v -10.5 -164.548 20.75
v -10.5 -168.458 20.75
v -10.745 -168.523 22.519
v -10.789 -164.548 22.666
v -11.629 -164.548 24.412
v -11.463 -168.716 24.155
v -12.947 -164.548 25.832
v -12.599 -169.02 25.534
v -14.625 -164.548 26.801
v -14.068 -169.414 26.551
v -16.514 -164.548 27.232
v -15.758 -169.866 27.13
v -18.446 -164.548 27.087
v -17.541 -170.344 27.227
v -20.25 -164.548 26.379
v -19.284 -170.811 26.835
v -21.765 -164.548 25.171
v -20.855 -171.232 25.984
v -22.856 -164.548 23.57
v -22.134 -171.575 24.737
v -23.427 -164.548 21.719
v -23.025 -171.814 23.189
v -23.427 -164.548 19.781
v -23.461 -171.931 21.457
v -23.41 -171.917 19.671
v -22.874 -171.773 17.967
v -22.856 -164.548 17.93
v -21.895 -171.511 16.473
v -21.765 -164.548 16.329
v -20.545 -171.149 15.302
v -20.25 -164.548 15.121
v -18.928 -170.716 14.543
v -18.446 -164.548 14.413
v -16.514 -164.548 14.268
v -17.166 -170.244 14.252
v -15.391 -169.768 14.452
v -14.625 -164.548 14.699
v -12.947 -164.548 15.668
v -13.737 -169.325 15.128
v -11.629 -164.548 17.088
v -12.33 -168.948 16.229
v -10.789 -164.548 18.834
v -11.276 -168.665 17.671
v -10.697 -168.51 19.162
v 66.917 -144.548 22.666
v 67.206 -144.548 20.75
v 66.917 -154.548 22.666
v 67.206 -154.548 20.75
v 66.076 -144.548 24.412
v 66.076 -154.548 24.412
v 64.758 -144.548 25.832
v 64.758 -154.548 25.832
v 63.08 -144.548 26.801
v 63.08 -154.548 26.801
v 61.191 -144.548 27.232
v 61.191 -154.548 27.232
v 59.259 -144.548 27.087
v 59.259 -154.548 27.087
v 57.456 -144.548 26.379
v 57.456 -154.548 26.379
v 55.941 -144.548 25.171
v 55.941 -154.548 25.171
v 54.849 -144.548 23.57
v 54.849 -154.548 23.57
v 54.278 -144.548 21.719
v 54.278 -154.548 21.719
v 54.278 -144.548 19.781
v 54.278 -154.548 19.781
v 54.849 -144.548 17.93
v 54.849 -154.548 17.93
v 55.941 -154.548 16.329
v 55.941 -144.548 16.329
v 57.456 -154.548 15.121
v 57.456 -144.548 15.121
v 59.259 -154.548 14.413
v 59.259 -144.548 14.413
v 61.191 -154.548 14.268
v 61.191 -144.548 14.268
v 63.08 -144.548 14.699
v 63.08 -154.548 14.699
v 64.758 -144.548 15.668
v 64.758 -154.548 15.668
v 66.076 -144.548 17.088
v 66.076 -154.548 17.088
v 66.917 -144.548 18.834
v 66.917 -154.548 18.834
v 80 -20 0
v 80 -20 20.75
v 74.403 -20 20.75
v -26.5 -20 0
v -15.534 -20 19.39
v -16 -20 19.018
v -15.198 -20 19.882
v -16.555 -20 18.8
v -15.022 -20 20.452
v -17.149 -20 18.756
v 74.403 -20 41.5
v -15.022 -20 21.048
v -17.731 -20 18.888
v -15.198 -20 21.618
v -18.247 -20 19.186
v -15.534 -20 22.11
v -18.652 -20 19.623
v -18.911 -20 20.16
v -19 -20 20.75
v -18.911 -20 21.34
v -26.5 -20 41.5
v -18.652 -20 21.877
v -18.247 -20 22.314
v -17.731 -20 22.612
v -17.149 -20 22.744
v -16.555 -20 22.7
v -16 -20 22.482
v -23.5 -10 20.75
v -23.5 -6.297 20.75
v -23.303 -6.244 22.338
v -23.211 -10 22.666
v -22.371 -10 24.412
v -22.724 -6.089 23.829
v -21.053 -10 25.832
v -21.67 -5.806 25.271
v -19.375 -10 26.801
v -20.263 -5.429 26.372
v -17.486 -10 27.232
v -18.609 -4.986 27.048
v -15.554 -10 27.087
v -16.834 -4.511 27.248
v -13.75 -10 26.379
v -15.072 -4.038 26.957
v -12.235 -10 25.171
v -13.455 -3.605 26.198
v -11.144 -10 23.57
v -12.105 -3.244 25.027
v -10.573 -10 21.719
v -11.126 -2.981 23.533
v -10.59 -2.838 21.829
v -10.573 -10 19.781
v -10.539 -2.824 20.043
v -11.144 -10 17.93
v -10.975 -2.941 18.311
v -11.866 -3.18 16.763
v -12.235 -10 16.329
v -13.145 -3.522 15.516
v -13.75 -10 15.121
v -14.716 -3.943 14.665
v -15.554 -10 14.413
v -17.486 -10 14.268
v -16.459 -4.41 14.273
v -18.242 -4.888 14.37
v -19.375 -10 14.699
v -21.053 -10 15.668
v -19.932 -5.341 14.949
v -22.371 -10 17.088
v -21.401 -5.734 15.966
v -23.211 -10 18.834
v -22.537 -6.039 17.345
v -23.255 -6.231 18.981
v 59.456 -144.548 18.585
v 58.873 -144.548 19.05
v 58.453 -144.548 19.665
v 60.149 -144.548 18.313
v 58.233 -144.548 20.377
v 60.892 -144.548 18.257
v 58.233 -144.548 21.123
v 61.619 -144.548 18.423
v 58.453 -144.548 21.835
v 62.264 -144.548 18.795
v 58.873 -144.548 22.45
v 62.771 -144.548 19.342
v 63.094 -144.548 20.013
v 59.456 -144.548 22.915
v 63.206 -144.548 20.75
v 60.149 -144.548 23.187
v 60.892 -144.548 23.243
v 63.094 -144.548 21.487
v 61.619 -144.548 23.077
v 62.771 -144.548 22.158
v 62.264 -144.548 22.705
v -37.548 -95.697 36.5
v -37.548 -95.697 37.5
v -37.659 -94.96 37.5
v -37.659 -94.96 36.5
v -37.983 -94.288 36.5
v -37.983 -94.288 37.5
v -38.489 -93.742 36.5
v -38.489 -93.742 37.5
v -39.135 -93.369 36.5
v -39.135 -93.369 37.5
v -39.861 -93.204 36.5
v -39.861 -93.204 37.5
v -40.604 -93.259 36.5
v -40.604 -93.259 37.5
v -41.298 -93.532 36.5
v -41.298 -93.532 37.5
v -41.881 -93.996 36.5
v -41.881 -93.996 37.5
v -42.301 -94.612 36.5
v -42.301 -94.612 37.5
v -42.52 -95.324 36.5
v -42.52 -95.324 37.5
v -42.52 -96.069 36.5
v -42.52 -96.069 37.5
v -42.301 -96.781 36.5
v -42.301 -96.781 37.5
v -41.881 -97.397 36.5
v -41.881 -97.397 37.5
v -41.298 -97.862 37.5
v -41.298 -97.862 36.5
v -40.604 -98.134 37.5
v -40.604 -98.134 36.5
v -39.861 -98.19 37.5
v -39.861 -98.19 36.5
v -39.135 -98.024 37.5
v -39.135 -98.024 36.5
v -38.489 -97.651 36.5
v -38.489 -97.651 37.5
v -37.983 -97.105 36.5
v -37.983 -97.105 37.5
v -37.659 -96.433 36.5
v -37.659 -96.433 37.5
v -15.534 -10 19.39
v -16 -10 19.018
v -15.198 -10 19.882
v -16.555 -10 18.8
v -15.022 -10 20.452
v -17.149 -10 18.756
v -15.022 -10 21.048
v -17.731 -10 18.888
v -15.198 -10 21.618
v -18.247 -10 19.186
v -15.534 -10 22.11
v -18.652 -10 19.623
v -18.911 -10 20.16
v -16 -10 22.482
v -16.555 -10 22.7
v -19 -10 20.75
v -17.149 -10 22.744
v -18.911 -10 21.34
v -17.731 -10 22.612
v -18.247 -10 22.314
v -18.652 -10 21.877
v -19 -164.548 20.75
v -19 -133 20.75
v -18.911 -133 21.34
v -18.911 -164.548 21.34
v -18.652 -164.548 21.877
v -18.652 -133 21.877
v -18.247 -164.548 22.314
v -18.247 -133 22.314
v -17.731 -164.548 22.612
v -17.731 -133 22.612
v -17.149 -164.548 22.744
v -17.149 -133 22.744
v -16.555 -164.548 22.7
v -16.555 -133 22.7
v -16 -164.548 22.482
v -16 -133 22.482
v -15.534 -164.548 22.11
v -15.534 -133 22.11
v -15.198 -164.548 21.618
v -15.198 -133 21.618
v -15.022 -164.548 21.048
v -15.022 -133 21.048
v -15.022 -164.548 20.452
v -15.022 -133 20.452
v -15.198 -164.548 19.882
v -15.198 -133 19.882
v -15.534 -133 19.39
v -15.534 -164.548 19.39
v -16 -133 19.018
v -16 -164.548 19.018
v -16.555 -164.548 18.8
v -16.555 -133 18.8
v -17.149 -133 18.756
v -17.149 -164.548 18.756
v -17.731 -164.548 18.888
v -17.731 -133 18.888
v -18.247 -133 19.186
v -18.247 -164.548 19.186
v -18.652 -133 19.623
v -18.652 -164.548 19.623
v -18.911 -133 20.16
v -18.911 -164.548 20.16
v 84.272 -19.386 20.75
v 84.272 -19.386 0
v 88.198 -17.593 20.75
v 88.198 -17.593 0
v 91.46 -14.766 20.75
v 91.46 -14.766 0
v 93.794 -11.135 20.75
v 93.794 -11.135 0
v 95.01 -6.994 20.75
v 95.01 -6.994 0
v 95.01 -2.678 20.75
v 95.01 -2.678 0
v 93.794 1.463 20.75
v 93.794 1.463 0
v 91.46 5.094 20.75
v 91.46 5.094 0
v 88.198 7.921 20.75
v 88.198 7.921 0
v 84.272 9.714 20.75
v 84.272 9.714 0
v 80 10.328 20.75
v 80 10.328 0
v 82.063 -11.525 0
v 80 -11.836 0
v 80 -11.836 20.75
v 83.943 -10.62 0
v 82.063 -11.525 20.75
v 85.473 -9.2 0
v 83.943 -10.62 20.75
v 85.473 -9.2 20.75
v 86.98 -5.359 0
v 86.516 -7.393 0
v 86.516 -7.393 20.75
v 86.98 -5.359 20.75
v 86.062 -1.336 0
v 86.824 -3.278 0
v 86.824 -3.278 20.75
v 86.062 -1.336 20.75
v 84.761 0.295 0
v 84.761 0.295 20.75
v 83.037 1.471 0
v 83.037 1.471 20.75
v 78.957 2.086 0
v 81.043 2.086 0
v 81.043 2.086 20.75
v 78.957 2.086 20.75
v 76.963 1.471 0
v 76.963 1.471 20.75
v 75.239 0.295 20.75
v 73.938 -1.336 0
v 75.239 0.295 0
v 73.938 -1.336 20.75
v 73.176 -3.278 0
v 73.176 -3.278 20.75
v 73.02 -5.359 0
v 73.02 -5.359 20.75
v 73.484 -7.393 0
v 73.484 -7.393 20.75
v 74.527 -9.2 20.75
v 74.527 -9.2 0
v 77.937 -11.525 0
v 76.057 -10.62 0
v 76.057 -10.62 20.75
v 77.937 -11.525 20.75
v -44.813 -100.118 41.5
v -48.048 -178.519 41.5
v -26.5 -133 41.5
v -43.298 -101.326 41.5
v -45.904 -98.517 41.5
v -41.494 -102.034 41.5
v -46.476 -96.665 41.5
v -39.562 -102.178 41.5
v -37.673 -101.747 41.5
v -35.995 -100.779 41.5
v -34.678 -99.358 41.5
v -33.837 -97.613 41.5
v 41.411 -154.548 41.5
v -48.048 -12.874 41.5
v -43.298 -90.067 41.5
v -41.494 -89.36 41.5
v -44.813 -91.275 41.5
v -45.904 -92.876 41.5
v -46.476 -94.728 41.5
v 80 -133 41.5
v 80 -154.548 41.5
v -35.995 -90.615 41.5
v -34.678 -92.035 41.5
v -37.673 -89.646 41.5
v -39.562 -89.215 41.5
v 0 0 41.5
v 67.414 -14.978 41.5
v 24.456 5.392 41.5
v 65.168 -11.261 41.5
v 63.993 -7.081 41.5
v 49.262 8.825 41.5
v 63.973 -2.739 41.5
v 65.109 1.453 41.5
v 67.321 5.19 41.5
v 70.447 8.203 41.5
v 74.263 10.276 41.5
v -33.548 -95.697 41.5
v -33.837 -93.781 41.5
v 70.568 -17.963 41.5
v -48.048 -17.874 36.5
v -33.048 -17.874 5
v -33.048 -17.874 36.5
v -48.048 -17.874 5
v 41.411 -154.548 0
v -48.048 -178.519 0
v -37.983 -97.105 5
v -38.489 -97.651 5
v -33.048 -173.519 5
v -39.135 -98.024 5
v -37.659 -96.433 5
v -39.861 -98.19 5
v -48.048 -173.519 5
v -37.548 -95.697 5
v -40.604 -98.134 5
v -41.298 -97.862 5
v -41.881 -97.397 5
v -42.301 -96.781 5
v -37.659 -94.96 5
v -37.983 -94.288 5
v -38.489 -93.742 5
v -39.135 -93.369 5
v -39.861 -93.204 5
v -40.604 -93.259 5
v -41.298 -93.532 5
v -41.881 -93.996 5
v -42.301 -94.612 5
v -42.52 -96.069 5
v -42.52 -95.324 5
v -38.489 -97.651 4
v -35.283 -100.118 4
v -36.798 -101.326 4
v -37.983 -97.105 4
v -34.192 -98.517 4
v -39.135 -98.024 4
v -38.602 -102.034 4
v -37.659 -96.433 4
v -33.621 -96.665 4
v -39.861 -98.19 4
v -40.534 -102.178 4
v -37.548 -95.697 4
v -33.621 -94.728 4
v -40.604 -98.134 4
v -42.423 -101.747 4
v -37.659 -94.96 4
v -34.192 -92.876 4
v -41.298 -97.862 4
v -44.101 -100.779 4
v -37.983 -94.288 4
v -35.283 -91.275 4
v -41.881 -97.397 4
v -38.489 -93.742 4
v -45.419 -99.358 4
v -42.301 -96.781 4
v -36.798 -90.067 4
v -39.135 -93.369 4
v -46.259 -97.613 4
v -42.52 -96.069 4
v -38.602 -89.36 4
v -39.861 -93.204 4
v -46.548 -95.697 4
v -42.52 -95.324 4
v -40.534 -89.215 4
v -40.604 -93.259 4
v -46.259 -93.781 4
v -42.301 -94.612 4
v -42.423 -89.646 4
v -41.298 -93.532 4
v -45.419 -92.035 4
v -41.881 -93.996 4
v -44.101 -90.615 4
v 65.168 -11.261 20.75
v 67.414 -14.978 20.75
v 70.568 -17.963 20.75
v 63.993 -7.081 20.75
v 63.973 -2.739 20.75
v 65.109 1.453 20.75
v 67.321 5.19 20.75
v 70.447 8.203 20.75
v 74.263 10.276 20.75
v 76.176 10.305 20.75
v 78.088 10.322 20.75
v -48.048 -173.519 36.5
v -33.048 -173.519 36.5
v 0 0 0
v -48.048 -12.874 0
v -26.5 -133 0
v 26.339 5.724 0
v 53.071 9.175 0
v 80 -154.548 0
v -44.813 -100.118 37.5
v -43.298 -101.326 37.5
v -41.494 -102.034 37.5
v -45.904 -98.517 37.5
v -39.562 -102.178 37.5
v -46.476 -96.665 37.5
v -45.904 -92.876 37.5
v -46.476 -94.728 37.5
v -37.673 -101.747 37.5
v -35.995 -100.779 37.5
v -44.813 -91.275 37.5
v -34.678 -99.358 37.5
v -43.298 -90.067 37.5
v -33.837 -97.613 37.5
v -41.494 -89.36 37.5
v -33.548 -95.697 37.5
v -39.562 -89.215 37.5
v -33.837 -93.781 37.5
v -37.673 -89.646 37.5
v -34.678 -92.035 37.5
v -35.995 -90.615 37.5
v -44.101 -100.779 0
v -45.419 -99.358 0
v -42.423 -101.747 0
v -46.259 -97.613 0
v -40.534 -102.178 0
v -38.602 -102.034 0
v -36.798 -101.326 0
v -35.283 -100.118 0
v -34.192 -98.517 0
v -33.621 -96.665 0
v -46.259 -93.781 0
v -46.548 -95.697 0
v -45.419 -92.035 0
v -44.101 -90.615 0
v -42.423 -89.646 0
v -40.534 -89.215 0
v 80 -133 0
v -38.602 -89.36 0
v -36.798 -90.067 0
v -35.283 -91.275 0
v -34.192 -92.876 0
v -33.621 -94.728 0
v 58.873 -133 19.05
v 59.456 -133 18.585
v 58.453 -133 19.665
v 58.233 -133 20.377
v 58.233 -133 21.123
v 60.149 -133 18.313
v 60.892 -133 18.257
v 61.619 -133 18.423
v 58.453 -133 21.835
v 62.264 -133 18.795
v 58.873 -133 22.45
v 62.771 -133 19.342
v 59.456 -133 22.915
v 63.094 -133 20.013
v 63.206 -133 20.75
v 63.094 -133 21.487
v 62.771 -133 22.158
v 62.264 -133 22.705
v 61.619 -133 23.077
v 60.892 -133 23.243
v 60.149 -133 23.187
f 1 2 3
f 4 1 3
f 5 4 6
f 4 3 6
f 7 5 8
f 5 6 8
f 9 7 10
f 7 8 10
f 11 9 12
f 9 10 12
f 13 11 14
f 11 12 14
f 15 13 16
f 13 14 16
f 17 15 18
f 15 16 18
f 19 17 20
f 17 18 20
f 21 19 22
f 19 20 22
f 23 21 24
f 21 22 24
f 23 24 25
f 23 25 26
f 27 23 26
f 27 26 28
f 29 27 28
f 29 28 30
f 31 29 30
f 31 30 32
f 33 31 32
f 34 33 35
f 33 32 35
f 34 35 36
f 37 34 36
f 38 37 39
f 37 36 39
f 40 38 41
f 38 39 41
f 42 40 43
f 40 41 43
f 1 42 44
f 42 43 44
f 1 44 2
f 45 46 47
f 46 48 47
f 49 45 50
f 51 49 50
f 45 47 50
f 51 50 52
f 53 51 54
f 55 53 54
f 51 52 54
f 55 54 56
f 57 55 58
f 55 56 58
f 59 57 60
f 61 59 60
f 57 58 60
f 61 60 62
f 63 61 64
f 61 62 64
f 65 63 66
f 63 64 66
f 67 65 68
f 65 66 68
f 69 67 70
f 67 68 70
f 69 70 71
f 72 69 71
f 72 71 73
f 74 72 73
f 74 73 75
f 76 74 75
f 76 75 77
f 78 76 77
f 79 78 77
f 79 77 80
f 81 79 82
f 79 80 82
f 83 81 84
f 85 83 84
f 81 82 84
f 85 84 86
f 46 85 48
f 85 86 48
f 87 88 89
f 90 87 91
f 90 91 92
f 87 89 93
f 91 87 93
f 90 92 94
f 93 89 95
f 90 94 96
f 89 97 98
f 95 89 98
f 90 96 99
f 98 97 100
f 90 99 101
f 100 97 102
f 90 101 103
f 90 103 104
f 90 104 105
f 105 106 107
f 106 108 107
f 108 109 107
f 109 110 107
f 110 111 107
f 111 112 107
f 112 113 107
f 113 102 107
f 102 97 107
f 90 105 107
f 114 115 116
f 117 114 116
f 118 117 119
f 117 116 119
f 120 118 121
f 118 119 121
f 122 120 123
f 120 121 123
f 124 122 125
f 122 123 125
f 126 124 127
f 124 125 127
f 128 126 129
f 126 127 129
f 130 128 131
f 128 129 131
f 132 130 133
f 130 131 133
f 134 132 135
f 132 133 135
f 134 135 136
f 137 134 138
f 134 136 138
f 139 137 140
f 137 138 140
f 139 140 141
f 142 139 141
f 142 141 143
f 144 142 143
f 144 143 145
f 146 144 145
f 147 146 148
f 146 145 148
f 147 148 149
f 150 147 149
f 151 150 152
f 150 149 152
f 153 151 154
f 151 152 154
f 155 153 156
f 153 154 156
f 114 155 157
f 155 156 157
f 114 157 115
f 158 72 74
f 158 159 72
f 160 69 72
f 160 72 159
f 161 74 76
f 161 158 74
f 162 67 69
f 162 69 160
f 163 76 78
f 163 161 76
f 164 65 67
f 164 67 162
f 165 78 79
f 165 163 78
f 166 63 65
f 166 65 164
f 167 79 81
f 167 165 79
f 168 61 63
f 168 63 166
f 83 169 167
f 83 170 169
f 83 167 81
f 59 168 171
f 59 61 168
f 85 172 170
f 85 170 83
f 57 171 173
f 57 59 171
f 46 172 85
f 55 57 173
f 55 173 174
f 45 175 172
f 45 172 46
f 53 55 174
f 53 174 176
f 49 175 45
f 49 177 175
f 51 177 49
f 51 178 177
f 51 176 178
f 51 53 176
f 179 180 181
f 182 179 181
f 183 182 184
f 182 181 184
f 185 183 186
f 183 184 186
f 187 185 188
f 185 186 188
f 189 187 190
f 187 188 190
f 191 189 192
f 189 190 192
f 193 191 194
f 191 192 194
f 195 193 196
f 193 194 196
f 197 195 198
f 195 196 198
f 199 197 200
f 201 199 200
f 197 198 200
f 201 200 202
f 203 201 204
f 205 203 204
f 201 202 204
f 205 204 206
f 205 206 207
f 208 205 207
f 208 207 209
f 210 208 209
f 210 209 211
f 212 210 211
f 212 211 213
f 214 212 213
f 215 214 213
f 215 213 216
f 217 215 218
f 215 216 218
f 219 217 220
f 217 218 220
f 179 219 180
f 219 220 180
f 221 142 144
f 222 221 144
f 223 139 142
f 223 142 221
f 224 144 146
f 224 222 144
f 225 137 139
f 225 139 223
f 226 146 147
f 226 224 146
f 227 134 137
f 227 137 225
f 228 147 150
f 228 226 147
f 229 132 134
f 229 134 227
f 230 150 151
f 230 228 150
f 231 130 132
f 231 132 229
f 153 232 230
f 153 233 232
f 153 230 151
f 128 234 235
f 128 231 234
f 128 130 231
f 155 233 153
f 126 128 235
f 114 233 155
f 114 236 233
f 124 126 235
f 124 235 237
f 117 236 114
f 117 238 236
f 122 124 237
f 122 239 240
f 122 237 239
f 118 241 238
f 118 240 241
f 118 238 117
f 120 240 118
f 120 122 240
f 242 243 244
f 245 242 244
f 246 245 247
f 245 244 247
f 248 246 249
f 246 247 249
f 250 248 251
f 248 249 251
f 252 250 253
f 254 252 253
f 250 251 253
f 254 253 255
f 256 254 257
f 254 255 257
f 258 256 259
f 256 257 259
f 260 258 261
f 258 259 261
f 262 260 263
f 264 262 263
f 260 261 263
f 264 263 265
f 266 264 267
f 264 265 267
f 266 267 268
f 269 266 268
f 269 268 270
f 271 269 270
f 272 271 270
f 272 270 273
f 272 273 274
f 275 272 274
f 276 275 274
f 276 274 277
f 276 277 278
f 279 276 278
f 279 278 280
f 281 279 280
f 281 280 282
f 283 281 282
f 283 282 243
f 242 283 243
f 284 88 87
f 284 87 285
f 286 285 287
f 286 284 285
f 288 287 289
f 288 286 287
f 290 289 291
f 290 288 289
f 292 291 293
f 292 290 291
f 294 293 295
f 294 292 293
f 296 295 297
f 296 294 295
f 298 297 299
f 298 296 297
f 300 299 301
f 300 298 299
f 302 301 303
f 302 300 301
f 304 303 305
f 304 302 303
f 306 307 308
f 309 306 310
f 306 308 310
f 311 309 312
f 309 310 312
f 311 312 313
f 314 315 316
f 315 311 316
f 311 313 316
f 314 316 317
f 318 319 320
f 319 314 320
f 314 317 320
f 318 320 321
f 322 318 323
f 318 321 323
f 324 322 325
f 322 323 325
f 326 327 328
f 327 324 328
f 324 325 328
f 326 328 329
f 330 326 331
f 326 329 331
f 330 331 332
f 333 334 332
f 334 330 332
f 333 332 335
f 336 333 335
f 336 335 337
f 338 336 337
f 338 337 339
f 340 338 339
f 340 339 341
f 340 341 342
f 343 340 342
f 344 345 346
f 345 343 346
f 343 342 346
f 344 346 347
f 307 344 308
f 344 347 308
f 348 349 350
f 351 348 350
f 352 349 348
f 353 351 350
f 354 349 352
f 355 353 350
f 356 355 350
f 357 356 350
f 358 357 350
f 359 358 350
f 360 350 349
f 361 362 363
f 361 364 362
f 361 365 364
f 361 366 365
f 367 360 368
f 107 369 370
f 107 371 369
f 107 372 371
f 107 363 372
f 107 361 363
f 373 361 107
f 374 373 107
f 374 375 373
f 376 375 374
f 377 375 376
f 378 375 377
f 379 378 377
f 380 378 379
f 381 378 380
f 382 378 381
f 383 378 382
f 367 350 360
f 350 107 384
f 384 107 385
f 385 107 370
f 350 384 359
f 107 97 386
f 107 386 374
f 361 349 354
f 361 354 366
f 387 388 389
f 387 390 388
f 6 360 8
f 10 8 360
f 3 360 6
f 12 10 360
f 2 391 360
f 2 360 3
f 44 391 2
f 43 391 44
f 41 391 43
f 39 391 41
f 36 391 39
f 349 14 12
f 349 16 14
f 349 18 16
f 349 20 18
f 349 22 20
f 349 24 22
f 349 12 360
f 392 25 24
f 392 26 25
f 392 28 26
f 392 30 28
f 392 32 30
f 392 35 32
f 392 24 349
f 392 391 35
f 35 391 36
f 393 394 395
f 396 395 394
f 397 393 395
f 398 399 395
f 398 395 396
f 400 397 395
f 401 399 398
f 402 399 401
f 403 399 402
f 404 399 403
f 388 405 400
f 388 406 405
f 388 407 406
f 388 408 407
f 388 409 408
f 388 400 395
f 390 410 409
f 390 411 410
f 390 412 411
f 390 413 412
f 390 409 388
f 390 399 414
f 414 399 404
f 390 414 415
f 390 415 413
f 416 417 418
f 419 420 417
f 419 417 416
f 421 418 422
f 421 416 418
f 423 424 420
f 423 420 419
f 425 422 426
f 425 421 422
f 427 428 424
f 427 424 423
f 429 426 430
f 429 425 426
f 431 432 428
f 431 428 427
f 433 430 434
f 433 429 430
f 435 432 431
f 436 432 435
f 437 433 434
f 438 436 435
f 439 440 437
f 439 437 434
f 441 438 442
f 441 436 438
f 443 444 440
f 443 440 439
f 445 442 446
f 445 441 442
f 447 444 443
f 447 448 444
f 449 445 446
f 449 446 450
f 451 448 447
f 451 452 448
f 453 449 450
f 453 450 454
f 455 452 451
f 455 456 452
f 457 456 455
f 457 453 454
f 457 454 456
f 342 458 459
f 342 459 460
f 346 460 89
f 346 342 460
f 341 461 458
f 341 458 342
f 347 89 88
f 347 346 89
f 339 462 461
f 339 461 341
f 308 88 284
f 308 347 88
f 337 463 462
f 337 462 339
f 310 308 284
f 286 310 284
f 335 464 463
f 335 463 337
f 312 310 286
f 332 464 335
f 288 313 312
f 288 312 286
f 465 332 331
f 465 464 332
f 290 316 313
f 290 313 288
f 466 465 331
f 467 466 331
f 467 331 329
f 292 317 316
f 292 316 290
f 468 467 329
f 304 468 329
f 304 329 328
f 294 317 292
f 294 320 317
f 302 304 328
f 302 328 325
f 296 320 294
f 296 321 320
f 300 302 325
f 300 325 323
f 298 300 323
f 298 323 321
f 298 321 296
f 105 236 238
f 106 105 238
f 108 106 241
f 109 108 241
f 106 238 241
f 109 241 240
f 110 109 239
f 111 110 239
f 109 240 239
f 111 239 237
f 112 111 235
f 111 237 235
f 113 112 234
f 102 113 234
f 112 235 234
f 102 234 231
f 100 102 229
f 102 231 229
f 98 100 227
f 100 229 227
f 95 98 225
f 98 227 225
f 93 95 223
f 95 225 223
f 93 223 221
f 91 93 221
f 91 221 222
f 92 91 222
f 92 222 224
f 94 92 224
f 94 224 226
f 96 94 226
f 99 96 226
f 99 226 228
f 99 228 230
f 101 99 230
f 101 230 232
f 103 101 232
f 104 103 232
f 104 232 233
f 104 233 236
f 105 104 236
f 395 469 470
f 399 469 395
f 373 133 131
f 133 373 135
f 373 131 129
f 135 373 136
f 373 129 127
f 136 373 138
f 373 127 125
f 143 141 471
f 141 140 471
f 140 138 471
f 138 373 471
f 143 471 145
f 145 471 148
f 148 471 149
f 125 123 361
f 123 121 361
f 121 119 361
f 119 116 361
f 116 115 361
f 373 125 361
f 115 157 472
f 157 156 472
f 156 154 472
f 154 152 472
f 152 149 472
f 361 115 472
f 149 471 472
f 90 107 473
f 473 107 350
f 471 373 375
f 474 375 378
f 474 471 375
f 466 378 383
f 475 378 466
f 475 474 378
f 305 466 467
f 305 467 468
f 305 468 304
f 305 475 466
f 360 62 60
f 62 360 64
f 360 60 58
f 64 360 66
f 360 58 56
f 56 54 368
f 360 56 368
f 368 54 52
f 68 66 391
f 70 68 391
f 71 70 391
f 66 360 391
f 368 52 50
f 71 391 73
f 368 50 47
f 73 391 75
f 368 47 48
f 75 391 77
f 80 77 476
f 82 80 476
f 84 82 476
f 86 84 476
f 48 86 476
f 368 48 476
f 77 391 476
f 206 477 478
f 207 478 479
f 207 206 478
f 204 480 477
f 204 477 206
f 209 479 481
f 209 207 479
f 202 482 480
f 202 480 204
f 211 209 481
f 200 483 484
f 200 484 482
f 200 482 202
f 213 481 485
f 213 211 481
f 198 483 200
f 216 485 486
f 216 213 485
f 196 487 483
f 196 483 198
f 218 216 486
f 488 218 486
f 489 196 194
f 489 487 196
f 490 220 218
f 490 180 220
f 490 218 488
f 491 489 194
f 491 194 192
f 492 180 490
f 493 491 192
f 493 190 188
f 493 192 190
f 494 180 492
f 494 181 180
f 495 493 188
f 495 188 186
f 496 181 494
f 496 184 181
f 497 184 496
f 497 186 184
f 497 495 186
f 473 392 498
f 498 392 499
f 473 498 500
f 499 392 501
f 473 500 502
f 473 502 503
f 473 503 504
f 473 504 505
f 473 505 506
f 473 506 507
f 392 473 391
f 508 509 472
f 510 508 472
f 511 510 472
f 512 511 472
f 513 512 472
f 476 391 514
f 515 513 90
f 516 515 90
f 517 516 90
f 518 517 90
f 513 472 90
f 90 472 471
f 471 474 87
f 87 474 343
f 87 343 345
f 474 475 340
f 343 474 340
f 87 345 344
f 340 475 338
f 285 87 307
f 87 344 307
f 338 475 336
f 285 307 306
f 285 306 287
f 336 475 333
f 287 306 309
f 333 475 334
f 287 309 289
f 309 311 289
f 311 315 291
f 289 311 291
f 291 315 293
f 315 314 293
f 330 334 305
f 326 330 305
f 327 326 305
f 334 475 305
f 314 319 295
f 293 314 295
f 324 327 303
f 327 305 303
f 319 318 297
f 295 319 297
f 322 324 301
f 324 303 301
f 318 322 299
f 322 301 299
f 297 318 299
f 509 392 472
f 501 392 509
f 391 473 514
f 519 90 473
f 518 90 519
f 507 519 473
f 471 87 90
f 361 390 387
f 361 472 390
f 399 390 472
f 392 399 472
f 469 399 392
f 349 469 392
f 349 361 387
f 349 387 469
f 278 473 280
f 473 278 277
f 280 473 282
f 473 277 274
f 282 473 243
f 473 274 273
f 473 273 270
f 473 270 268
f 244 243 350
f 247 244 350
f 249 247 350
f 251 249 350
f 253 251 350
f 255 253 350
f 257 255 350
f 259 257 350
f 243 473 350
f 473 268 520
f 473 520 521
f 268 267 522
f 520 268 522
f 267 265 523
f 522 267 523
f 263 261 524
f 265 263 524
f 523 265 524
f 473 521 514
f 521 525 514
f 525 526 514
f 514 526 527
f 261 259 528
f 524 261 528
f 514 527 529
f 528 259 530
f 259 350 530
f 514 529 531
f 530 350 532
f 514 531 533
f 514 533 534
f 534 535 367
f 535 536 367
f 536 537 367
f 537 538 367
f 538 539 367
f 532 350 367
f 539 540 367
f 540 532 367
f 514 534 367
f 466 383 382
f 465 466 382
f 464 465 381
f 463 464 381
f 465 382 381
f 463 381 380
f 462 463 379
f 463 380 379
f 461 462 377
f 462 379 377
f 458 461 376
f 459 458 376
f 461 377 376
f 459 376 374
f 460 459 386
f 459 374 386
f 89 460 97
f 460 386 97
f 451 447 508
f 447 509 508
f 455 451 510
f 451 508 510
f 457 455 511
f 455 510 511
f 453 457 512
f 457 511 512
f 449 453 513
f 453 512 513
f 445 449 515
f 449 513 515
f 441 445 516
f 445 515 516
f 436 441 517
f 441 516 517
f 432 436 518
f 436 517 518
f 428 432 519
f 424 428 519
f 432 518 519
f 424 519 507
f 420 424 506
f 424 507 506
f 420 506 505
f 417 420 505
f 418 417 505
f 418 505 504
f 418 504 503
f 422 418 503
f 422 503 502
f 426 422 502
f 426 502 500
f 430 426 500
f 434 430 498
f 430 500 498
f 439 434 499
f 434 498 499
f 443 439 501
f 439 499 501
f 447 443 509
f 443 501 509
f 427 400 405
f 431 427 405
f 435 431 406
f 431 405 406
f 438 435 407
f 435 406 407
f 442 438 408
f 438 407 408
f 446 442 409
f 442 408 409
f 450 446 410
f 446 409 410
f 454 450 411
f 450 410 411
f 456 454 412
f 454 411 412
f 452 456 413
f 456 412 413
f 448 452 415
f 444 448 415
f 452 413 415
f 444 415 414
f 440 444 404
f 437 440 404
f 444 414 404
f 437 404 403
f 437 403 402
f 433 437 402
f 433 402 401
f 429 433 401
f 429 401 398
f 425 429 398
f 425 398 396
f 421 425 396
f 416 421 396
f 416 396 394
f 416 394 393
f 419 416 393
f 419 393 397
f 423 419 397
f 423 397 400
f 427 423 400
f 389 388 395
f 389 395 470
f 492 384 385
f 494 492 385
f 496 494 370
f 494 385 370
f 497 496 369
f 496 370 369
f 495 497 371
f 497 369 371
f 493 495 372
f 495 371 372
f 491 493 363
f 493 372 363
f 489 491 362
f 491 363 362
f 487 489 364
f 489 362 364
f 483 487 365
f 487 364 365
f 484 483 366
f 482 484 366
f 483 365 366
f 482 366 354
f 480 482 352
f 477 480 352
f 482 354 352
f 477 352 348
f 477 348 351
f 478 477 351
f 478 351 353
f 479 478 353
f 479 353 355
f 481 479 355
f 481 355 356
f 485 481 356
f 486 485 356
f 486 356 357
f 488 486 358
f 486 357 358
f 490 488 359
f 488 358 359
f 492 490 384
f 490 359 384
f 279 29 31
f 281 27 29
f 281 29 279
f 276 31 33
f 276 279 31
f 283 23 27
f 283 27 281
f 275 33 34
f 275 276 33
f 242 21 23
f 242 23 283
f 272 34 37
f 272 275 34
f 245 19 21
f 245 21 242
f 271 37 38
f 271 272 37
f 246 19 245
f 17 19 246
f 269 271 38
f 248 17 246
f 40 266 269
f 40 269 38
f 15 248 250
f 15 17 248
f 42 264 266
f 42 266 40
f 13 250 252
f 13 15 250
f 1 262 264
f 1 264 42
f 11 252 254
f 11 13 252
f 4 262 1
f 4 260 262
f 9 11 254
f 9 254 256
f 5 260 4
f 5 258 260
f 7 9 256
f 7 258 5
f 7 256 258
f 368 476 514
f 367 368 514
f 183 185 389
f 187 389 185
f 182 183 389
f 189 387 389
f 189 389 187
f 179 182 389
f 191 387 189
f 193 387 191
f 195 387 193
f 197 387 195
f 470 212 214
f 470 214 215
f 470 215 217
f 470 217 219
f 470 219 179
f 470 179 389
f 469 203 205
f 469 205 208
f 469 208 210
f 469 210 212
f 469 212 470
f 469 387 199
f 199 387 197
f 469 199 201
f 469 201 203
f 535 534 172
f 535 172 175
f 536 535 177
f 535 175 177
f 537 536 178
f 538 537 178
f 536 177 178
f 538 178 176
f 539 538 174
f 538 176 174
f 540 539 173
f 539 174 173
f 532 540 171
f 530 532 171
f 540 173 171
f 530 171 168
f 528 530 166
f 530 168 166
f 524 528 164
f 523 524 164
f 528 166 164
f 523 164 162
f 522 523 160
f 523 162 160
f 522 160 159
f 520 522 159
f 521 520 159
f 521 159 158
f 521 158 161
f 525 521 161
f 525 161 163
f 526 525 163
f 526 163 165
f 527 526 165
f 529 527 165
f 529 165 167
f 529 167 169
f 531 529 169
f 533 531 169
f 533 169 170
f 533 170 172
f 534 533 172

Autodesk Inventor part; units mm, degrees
ref_plane "YZ Plane" through (0, 0, 0) normal (1, 0, 0) x (0, 1, 0)
ref_plane "XZ Plane" through (0, 0, 0) normal (0, 1, 0) x (-1, 0, 0)
sketch "Sketch1" plane through (0, 0, 0) normal (0, 0, 1) x (1, 0, 0)
  line L0 (0, 0) -> (160, 0) construction
  line L1 (160, 0) -> (118.589, -154.5481) construction
  line L2 (0, 0) -> (41.411, -154.5481) construction
  line L3 (41.411, -154.5481) -> (118.589, -154.5481)
  circle A0 centre (235.8871, -103.156) radius 80 construction
  line L4 (160, 0) -> (256.5926, -25.8819)
  line L5 (118.589, -154.5481) -> (215.1815, -180.43)
  arc A1 (215.1815, -180.43) -> (256.5926, -25.8819) centre (235.8871, -103.156) ccw
  circle A2 centre (-75.8871, -103.156) radius 80 construction
  line L6 (0, 0) -> (-96.5926, -25.8819)
  line L7 (41.411, -154.5481) -> (-55.1815, -180.43)
  arc A3 (-96.5926, -25.8819) -> (-55.1815, -180.43) centre (-75.8871, -103.156) ccw
  arc A4 (160, 0) -> (0, 0) centre (80, -304.672) ccw
  dimension "d0" = 160
  dimension "d1" = 160
  dimension "d2" = 160
  dimension "d3" = 75
  dimension "d4" = 75
  dimension "d5" = 160
  dimension "d6" = 100
  dimension "d7" = 160
  dimension "d9" = 100
  dimension "d56" = 315
extrude "Extrusion1" add sketch "Sketch1" along normal blind 41.5
sketch "Sketch2" plane through (0, 0, 41.5) normal (0, 0, 1) x (1, 0, 0)
  line L0 (-26.5, -133) -> (186.5, -133)
  line L1 (186.5, -133) -> (186.5, -20)
  line L2 (186.5, -20) -> (-26.5, -20)
  line L3 (-26.5, -20) -> (-26.5, -133)
  line L4 (0, 0) -> (-96.5926, -25.8819) projected
  arc A0 (160, 0) -> (0, 0) centre (80, -304.672) ccw projected
  line L5 (0, 0) -> (160, 0)
  point P0 (80, -20)
  point P1 (80, 0)
  dimension "d12" = 213
  dimension "d13" = 113
  dimension "d57" = 20
extrude "Extrusion2" cut sketch "Sketch2" against normal through all contours L3 L2 L1 L0
sketch "Sketch3" plane through (0, 0, 41.5) normal (0, 0, 1) x (1, 0, 0)
  line L0 (186.5, -20) -> (186.5, -133) construction
  line L1 (186.5, -133) -> (-26.5, -133) construction
  line L2 (-26.5, -133) -> (-26.5, -20) construction
  line L3 (-26.5, -20) -> (186.5, -20) construction
  line L4 (0, 0) -> (-96.5926, -25.8819) construction
  arc A0 (-96.5926, -25.8819) -> (-55.1815, -180.43) centre (-75.8871, -103.156) ccw construction
  line L5 (-55.1815, -180.43) -> (41.411, -154.5481) construction
  line L6 (41.411, -154.5481) -> (118.589, -154.5481) construction
  line L7 (118.589, -154.5481) -> (215.1815, -180.43) construction
  arc A1 (215.1815, -180.43) -> (256.5926, -25.8819) centre (235.8871, -103.156) ccw construction
  line L8 (256.5926, -25.8819) -> (160, 0) construction
  line L9 (-48.0481, -154.5481) -> (208.0481, -154.5481) construction
  line L10 (208.0481, -154.5481) -> (208.0481, 10.328) construction
  line L11 (-48.0481, 10.328) -> (-48.0481, -154.5481) construction
  line L12 (-48.0481, 10.328) -> (-48.0481, -178.5186)
  line L13 (-55.1815, -180.43) -> (41.411, -154.5481) projected
  line L14 (208.0481, 10.328) -> (208.0481, -178.5186)
  line L15 (118.589, -154.5481) -> (215.1815, -180.43) projected
  line L16 (-48.0481, -178.5186) -> (208.0481, -178.5186)
  line L17 (-48.0481, 10.328) -> (208.0481, 10.328)
  line L18 (-157.6505, -218.8456) -> (317.6505, -218.8456)
  line L19 (317.6505, -218.8456) -> (317.6505, 50.655)
  line L20 (317.6505, 50.655) -> (-157.6505, 50.655)
  line L21 (-157.6505, 50.655) -> (-157.6505, -218.8456)
  arc A2 (160, 0) -> (0, 0) centre (80, -304.672) ccw projected
  point P0 (80, -154.5481)
  point P1 (80, 10.328)
  point P2 (208.0481, -84.0953)
  point P3 (317.6505, -84.0953)
  point P4 (80, 10.328)
  point P5 (80, -218.8456)
  dimension "d22" = 269.5006
  dimension "d23" = 475.3011
extrude "Extrusion3" cut sketch "Sketch3" against normal through all
sketch "Sketch5" plane through (0, 0, 41.5) normal (0, 0, 1) x (1, 0, 0)
  line L0 (118.589, -154.5481) -> (208.0481, -178.5186) projected
  line L1 (208.0481, -178.5186) -> (80, -178.5186)
  line L2 (80, -178.5186) -> (80, 10.328)
  line L3 (80, 10.328) -> (208.0481, 10.328)
  line L4 (208.0481, 10.328) -> (208.0481, -178.5186)
  arc A0 (160, 0) -> (0, 0) centre (80, -304.672) ccw projected
extrude "Extrusion4" cut sketch "Sketch5" against normal through all
sketch "Sketch6" plane through (0, 0, 0) normal (0, 1, 0) x (-1, 0, 0)
  circle A0 centre (17, 20.75) radius 2
  line L0 (26.5, 41.5) -> (26.5, 0) projected
  point P0 (26.5, 20.75)
  dimension "d24" = 4
  dimension "d58" = 9.5
extrude "Extrusion5" cut sketch "Sketch6" along normal through all both and the other way through all
sketch "Sketch7" plane through (0, 0, 0) normal (0, 1, 0) x (-1, 0, 0)
  circle A0 centre (17, 20.75) radius 2 projected
  circle A1 centre (17, 20.75) radius 6.5
  dimension "d59" = 13
extrude "Extrusion6" cut sketch "Sketch7" against normal blind 10
ref_plane "Work Plane1" through (41.411, -174.5481, 0) normal (0, -1, 0) x (1, 0, 0)
sketch "Sketch8" plane through (41.411, -174.5481, 0) normal (0, -1, 0) x (1, 0, 0)
  circle A0 centre (-58.411, 20.75) radius 2 projected
  circle A1 centre (-58.411, 20.75) radius 6.5
  point P0 (-41.411, 0)
  dimension "d32" = 13
extrude "Extrusion7" cut sketch "Sketch8" against normal blind 10
sketch "Sketch11" plane through (41.411, -154.5481, 0) normal (0, -1, 0) x (1, 0, 0)
  line L0 (0, 41.5) -> (38.589, 41.5) projected
  line L1 (0, 0) -> (0, 41.5) projected
  line L2 (0, 0) -> (38.589, 0) projected
  line L3 (38.589, 0) -> (38.589, 41.5) projected
  circle A0 centre (19.2945, 20.75) radius 2.5
  circle A1 centre (19.2945, 20.75) radius 6.5
  point P0 (-41.411, 0)
  point P1 (0, 20.75)
  point P2 (19.2945, 41.5)
  dimension "d73" = 5
  dimension "d74" = 13
extrude "Extrusion10" cut sketch "Sketch11" against normal blind 10 contours A1
sketch "Sketch12" plane through (-48.0481, -178.5186, 41.5) normal (-1, 0, 0) x (0, 0, 1)
  line L0 (-41.5, 0) -> (-41.5, 165.6442) projected
  line L1 (0, 0) -> (-41.5, 0) projected
  line L2 (0, 165.6442) -> (0, 0) projected
  line L3 (-41.5, 165.6442) -> (0, 165.6442) projected
  line L4 (-5, 5) -> (-36.5, 5)
  line L5 (-36.5, 5) -> (-36.5, 160.6442)
  line L6 (-36.5, 160.6442) -> (-5, 160.6442)
  line L7 (-5, 160.6442) -> (-5, 5)
  point P0 (-41.5, 178.5186)
  dimension "d43" = 5
extrude "Extrusion11" cut sketch "Sketch12" against normal blind 15 contours L4 L5 L6 L7
sketch "Sketch13" plane through (0, 0, 41.5) normal (0, 0, 1) x (1, 0, 0)
  circle A0 centre (-40.0481, -95.6966) radius 2.5
  line L0 (-48.0481, -12.8745) -> (-48.0481, -178.5186) projected
  point P0 (0, 0)
  point P1 (-48.0481, -95.6966)
  dimension "d46" = 5
  dimension "d47" = 8
extrude "Extrusion12" cut sketch "Sketch13" against normal through all
sketch "Sketch14" plane through (0, 0, 41.5) normal (0, 0, 1) x (1, 0, 0)
  circle A0 centre (-40.0481, -95.6966) radius 2.5 projected
  circle A1 centre (-40.0481, -95.6966) radius 6.5
  point P0 (0, 0)
  dimension "d50" = 13
extrude "Extrusion13" cut sketch "Sketch14" against normal blind 4
sketch "Sketch15" plane through (0, 0, 0) normal (0, 0, -1) x (-1, 0, 0)
  circle A0 centre (40.0481, -95.6966) radius 2.5 projected
  circle A1 centre (40.0481, -95.6966) radius 2.5 projected
  circle A2 centre (40.0481, -95.6966) radius 6.5
  point P0 (0, 0)
  dimension "d53" = 13
extrude "Extrusion14" cut sketch "Sketch15" against normal blind 4
sketch "Sketch16" plane through (0, 0, 41.5) normal (0, 0, 1) x (1, 0, 0)
  line L0 (80, -20) -> (80, 10.328) construction
  circle A0 centre (80, -4.836) radius 7 construction
  circle A1 centre (80, -4.836) radius 15.164 construction
  arc A2 (80, -20) -> (80, 10.328) centre (80, -4.836) ccw
  arc A3 (80, -11.836) -> (80, 2.164) centre (80, -4.836) ccw
  arc A4 (80, 10.328) -> (0, 0) centre (80, -304.672) ccw projected
  line L1 (80, 10.328) -> (80, 2.164)
  line L2 (80, -11.836) -> (80, -20)
  dimension "d62" = 14
extrude "Extrusion15" add sketch "Sketch16" against normal blind 41.5
sketch "Sketch17" plane through (0, 0, 41.5) normal (0, 0, 1) x (1, 0, 0)
  arc A0 (80, -11.836) -> (80, 2.164) centre (80, -4.836) ccw construction
  circle A1 centre (80, -4.836) radius 7
  point P0 (0, 0)
extrude "Extrusion16" cut sketch "Sketch17" against normal through all
sketch "Sketch19" plane through (0, 0, 41.5) normal (0, 0, 1) x (1, 0, 0)
  circle A0 centre (80, -4.836) radius 7 projected
  arc A1 (80, -20) -> (80, 10.328) centre (80, -4.836) ccw projected
  circle A2 centre (80, -4.836) radius 15.164 construction
  circle A3 centre (80, -4.836) radius 16.164
  point P0 (0, 0)
  dimension "d72" = 1
extrude "Extrusion18" cut sketch "Sketch19" against normal blind 20.75
sketch "Sketch20" plane through (60.7055, -154.5481, 20.75) normal (0, -1, 0) x (1, 0, 0)
  circle A0 centre (0, 0) radius 2.5 projected
  point P0 (-60.7055, -20.75)
extrude "Extrusion19" cut sketch "Sketch20" against normal blind 50
properties part number "Riser Base" material "ABS Plastic"
